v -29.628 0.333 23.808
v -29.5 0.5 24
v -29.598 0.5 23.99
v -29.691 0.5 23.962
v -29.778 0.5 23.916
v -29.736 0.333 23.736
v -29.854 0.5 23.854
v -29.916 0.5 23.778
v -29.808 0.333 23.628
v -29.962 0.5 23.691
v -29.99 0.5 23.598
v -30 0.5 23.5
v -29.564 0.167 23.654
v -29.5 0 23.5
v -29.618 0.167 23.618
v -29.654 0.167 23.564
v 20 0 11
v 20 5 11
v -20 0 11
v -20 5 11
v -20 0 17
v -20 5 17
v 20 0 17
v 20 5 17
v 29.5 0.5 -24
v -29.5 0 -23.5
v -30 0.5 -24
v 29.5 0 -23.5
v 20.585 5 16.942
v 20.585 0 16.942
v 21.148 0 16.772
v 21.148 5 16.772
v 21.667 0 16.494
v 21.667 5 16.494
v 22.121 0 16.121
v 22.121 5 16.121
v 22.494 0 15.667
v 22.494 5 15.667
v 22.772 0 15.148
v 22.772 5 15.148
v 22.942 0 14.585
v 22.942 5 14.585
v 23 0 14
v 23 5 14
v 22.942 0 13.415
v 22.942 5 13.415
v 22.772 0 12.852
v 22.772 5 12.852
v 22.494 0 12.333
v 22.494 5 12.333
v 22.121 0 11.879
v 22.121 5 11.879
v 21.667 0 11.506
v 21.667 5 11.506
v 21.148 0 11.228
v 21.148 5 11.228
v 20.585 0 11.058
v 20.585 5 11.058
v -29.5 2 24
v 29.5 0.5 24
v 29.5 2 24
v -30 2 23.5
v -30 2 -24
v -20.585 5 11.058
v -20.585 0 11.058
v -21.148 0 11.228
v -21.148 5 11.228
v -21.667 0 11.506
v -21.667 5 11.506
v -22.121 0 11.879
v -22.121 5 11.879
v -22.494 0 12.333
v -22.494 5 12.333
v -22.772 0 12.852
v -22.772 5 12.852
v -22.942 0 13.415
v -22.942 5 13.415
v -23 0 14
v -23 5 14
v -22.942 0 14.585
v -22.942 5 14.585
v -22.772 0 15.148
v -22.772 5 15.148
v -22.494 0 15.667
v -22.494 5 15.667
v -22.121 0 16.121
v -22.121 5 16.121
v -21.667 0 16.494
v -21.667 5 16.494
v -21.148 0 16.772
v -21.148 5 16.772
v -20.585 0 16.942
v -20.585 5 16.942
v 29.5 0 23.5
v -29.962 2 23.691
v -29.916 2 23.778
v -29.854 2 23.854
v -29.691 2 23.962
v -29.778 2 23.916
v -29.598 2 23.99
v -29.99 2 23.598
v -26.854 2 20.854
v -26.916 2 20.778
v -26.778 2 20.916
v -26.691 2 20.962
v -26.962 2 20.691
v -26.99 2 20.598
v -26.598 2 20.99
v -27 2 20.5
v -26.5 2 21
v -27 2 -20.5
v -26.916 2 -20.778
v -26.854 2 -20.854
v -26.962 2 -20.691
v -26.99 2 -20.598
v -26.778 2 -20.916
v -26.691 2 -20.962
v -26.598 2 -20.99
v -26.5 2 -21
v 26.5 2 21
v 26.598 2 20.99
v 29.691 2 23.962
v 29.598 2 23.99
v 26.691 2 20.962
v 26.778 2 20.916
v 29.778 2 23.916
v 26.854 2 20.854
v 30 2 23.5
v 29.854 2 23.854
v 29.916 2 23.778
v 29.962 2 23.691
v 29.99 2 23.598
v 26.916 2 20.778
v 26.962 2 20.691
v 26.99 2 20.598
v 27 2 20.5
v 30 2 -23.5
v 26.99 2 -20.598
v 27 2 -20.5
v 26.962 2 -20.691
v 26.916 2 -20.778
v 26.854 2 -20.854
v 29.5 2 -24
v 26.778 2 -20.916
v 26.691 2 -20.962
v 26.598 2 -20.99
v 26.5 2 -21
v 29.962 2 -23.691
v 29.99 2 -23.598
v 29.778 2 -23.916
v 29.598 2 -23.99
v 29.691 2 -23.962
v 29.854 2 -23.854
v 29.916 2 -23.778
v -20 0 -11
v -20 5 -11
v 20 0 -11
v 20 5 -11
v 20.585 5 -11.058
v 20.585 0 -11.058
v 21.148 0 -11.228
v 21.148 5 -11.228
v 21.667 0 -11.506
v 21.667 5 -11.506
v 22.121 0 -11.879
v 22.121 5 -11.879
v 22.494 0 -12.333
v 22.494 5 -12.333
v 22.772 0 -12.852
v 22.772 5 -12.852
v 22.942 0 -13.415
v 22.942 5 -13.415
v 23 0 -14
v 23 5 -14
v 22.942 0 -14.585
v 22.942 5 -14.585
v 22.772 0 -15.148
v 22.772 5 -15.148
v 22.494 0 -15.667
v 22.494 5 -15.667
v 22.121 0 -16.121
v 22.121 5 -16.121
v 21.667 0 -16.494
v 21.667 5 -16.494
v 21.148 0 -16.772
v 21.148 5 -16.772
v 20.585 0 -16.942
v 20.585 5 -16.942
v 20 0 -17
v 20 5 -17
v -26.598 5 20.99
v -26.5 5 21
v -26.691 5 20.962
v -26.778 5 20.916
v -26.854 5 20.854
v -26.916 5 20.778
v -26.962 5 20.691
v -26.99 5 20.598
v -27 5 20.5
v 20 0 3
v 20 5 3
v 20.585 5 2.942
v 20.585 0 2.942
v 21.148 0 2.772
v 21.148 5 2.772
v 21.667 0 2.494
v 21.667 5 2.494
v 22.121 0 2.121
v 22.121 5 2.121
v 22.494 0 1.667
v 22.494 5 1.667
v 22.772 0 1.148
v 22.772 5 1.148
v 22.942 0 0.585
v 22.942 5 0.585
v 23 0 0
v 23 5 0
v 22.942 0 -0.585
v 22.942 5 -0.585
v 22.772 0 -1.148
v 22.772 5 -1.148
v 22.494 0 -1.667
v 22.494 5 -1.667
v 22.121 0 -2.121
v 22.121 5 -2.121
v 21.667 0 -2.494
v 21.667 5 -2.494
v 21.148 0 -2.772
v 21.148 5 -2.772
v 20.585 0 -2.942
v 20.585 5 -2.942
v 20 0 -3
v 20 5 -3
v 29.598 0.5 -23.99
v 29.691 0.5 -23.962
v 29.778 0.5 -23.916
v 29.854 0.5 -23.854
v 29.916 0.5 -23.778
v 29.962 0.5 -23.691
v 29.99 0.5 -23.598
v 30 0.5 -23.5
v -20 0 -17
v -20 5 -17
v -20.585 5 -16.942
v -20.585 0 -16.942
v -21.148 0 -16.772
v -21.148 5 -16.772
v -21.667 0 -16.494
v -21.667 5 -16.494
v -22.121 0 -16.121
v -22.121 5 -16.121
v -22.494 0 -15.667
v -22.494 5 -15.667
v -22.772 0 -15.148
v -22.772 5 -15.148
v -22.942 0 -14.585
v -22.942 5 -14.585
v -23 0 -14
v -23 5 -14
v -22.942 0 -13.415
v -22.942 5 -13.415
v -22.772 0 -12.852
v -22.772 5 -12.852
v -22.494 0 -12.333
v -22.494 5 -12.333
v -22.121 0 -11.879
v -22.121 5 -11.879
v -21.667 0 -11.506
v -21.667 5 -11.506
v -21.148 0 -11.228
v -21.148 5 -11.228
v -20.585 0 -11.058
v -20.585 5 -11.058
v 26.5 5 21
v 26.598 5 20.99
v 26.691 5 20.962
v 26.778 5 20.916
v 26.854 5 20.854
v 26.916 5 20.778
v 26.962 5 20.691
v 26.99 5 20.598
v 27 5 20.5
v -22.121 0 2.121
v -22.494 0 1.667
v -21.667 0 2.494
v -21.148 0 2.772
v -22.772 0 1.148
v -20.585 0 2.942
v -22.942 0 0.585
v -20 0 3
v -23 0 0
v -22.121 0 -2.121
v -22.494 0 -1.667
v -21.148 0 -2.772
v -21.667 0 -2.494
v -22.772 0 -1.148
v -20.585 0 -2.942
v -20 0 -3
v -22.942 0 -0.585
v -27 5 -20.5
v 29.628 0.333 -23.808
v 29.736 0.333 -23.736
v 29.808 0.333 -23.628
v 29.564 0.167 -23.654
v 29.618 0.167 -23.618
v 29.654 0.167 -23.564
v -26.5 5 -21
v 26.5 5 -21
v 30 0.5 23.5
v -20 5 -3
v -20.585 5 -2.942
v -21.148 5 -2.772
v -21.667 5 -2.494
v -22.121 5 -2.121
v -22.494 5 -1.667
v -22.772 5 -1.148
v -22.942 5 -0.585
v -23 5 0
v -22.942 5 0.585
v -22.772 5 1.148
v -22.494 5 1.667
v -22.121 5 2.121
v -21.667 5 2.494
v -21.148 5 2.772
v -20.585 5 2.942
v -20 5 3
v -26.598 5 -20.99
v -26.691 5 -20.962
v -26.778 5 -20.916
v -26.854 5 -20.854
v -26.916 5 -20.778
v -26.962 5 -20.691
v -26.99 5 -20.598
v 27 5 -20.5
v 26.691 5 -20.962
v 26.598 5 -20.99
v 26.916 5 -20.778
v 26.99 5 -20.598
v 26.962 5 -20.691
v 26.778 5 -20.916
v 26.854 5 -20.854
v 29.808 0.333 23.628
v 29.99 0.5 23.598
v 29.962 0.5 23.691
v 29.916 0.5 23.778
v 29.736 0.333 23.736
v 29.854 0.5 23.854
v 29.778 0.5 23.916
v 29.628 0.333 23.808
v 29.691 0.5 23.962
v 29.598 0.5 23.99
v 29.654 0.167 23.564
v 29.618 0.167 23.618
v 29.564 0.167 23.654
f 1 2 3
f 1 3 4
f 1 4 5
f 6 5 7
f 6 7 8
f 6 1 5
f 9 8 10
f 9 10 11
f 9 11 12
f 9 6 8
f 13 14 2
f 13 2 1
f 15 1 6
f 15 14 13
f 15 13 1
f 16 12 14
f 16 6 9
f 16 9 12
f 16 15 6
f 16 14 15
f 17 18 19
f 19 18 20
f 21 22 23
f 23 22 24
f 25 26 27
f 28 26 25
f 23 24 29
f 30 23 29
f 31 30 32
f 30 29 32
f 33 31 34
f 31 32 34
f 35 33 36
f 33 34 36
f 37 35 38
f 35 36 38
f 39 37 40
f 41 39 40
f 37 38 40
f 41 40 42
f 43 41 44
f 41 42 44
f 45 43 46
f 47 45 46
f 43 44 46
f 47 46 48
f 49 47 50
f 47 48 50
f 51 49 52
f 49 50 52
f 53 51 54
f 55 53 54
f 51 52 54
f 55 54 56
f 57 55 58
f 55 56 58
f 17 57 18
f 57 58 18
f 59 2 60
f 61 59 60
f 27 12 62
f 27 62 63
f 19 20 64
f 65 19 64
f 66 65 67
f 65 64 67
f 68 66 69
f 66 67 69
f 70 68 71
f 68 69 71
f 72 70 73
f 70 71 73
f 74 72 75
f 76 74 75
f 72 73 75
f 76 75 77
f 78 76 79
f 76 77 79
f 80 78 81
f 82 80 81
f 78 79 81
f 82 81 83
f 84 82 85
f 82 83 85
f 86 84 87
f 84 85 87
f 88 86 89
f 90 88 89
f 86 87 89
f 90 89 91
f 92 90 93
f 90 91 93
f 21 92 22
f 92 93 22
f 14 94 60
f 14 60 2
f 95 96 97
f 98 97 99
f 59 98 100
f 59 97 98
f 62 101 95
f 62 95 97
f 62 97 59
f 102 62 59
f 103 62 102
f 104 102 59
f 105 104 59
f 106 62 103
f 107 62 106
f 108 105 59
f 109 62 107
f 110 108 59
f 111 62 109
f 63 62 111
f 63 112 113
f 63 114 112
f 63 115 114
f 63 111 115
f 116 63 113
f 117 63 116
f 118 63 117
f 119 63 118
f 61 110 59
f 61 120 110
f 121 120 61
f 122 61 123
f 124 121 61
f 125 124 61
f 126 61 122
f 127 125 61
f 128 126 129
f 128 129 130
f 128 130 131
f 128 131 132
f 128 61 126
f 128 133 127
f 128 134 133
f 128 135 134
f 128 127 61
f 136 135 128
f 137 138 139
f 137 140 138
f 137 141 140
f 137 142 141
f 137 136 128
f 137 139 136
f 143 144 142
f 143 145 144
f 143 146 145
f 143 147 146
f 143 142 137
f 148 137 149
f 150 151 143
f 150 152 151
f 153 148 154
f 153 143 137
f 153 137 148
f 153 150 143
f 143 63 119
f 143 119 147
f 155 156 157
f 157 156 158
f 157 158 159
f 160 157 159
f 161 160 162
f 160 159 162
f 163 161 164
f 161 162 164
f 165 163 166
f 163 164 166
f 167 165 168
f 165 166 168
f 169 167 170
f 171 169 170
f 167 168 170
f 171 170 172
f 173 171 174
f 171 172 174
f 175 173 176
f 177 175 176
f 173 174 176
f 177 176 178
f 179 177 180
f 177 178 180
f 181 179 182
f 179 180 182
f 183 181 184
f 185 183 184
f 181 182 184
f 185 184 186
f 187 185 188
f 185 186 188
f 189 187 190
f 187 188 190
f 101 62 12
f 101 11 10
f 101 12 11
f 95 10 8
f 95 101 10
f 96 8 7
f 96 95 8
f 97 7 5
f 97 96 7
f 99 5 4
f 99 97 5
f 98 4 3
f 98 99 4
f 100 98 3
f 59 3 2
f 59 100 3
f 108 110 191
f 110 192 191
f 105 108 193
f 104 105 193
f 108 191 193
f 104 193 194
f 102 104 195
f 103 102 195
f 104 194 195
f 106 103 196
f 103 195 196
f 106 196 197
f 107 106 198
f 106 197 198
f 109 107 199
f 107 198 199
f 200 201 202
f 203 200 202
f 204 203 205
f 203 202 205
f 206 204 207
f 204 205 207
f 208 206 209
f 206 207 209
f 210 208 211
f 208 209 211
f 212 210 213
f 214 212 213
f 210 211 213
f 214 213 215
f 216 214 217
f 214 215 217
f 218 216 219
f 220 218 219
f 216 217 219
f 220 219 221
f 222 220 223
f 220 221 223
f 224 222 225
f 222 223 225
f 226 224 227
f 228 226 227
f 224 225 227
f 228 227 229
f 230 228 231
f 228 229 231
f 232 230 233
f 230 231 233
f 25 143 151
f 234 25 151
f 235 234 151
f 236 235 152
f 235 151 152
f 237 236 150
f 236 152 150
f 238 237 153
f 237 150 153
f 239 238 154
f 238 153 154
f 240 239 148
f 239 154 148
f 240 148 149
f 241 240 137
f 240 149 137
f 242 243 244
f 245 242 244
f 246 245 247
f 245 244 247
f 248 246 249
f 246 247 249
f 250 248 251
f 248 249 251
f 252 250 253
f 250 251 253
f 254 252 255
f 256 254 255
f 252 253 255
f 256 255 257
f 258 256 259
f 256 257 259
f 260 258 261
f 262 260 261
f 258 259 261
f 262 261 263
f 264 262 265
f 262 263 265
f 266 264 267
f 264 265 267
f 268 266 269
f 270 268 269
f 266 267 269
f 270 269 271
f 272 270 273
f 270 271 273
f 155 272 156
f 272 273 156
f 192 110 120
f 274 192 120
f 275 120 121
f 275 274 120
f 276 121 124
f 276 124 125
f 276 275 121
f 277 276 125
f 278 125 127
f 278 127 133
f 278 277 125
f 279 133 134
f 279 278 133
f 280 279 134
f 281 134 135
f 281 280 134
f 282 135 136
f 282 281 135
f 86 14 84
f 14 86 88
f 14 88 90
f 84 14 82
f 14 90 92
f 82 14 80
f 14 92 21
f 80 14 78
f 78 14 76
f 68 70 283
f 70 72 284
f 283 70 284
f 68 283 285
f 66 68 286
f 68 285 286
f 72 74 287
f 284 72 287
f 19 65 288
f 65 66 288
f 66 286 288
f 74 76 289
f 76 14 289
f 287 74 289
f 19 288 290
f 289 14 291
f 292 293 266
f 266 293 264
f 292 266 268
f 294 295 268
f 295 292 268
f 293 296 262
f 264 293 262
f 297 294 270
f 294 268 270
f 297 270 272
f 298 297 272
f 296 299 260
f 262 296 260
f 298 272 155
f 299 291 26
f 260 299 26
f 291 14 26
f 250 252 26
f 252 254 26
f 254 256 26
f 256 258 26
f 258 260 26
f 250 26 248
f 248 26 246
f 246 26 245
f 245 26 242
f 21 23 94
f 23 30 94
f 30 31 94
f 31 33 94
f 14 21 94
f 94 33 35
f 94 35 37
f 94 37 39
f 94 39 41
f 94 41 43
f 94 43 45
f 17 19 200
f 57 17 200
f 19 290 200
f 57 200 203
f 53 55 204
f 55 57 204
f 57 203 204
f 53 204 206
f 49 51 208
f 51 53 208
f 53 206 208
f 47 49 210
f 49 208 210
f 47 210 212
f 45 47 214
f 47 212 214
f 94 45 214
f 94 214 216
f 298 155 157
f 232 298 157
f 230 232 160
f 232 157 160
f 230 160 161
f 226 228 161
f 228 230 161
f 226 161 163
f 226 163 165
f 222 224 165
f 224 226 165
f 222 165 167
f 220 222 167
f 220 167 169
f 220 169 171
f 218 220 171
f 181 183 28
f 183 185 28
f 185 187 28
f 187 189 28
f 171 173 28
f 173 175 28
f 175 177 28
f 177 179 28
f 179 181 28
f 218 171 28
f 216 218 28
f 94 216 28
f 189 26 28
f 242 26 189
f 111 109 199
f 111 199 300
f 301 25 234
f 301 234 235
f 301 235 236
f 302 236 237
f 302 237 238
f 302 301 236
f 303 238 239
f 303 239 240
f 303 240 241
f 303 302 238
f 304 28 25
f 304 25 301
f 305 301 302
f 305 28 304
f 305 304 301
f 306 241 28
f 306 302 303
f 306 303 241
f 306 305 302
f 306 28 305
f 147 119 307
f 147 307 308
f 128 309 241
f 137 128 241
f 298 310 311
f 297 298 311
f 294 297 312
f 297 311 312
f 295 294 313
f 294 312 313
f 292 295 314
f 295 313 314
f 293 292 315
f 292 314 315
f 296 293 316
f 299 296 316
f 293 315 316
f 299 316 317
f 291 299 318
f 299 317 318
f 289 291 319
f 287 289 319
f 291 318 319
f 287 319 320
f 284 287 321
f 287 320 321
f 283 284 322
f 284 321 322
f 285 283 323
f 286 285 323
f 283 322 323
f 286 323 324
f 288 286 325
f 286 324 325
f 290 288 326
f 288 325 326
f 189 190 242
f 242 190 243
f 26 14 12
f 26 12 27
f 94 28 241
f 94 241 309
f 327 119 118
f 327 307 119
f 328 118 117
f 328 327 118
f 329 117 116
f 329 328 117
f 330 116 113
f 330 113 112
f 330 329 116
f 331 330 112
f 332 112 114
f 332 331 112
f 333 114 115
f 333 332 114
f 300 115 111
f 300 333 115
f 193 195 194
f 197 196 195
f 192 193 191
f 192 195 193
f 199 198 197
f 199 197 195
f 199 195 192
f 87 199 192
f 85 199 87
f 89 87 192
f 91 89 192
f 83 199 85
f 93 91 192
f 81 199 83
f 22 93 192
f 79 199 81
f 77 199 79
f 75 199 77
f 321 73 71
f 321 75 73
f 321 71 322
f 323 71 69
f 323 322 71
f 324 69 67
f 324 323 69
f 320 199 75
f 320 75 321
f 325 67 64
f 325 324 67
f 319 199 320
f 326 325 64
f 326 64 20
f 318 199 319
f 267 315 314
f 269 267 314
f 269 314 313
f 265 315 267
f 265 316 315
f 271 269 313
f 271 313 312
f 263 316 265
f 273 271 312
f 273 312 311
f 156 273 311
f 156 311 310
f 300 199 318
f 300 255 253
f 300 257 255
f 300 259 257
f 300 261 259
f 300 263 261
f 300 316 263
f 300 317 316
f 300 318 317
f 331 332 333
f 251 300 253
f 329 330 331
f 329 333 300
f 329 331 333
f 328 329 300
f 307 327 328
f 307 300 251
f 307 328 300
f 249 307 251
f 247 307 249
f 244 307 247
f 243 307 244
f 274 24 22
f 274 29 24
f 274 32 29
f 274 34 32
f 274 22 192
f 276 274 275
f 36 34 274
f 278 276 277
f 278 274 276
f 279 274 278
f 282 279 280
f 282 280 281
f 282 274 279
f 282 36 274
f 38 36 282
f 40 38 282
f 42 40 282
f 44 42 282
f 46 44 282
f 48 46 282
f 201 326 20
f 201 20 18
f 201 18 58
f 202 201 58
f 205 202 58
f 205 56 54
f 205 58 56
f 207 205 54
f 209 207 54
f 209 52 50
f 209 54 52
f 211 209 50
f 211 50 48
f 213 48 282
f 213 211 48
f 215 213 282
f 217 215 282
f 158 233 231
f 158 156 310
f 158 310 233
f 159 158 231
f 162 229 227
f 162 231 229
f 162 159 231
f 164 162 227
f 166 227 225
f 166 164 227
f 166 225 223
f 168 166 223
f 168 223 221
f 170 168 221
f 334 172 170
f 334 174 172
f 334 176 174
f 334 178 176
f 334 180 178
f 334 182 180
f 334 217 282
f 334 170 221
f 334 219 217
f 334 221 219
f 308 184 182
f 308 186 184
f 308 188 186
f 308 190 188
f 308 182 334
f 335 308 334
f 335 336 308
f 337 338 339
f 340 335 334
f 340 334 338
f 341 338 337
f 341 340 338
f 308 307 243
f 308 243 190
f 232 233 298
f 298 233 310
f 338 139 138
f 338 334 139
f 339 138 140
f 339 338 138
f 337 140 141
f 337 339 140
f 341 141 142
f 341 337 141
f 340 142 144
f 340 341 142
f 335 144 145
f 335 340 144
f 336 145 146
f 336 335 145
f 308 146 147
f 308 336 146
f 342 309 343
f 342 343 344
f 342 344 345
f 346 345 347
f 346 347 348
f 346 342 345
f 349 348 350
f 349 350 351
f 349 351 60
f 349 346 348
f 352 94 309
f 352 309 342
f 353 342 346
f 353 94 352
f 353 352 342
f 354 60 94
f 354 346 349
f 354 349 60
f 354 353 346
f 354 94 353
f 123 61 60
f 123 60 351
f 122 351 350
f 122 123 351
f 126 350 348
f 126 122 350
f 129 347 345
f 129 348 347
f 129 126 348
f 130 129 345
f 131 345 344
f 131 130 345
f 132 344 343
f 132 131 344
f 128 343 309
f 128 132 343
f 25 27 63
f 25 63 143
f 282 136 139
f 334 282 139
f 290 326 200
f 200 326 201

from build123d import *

# Parameters (mm, degrees)
SKETCH1_W           = 60
SKETCH1_H           = 48
BOSS_EXTRUDE1_DEPTH = 2
SKETCH2_W           = 54
SKETCH2_H           = 42
BOSS_EXTRUDE2_DEPTH = 3
CUT_EXTRUDE1_DEPTH  = 50
FILLET1_R           = 0.5
CHAMFER1_SIZE       = 0.5


with BuildPart() as part:
    # Sketch1 → Boss-Extrude1 (new body)
    with BuildSketch(Plane(origin=(0, 0, 0), x_dir=(1, 0, 0), z_dir=(0, 1, 0))):
        Rectangle(SKETCH1_W, SKETCH1_H)
    extrude(amount=BOSS_EXTRUDE1_DEPTH)

    # Sketch2 → Boss-Extrude2 (add)
    with BuildSketch(Plane(origin=(0, 2, 0), x_dir=(1, 0, 0), z_dir=(0, 1, 0))):
        Rectangle(SKETCH2_W, SKETCH2_H)
    extrude(amount=BOSS_EXTRUDE2_DEPTH)

    # Sketch4 → Cut-Extrude1 (cut)
    with BuildSketch(Plane(origin=(0, 5, 0), x_dir=(1, 0, 0), z_dir=(0, 1, 0))):
        with BuildLine():
            Line((-20, -3), (20, -3))
            ThreePointArc((20, -3), (23, 0), (20, 3))
            Line((20, 3), (-20, 3))
            ThreePointArc((-20, 3), (-23, 0), (-20, -3))
        make_face()
        with BuildLine():
            Line((-20, 11), (20, 11))
            ThreePointArc((20, 11), (23, 14), (20, 17))
            Line((20, 17), (-20, 17))
            ThreePointArc((-20, 17), (-23, 14), (-20, 11))
        make_face()
        with BuildLine():
            Line((-20, -17), (20, -17))
            ThreePointArc((20, -17), (23, -14), (20, -11))
            Line((20, -11), (-20, -11))
            ThreePointArc((-20, -11), (-23, -14), (-20, -17))
        make_face()
    extrude(amount=-CUT_EXTRUDE1_DEPTH, mode=Mode.SUBTRACT)

    # Fillet1
    fillet1_edges = [part.edges().sort_by_distance(p)[0] for p in [
        (-27, 3.5, -21),
        (-27, 3.5, 21),
        (27, 3.5, 21),
        (27, 3.5, -21),
        (30, 1, -24),
        (30, 1, 24),
        (-30, 1, 24),
    ]]
    fillet(fillet1_edges, radius=FILLET1_R)

    # Chamfer1
    chamfer1_edges = [part.edges().sort_by_distance(p)[0] for p in [
        (-30, 0, -0.25),
        (0, 0, 24),
        (-0.25, 0, -24),
        (30, 0, 0),
        (29.853553391, 0, -23.853553391),
        (29.853553391, 0, 23.853553391),
        (-29.853553391, 0, 23.853553391),
    ]]
    chamfer(chamfer1_edges, length=CHAMFER1_SIZE - 0.0001)  # a hair under: the kernel refuses the full size


solid = part.part
